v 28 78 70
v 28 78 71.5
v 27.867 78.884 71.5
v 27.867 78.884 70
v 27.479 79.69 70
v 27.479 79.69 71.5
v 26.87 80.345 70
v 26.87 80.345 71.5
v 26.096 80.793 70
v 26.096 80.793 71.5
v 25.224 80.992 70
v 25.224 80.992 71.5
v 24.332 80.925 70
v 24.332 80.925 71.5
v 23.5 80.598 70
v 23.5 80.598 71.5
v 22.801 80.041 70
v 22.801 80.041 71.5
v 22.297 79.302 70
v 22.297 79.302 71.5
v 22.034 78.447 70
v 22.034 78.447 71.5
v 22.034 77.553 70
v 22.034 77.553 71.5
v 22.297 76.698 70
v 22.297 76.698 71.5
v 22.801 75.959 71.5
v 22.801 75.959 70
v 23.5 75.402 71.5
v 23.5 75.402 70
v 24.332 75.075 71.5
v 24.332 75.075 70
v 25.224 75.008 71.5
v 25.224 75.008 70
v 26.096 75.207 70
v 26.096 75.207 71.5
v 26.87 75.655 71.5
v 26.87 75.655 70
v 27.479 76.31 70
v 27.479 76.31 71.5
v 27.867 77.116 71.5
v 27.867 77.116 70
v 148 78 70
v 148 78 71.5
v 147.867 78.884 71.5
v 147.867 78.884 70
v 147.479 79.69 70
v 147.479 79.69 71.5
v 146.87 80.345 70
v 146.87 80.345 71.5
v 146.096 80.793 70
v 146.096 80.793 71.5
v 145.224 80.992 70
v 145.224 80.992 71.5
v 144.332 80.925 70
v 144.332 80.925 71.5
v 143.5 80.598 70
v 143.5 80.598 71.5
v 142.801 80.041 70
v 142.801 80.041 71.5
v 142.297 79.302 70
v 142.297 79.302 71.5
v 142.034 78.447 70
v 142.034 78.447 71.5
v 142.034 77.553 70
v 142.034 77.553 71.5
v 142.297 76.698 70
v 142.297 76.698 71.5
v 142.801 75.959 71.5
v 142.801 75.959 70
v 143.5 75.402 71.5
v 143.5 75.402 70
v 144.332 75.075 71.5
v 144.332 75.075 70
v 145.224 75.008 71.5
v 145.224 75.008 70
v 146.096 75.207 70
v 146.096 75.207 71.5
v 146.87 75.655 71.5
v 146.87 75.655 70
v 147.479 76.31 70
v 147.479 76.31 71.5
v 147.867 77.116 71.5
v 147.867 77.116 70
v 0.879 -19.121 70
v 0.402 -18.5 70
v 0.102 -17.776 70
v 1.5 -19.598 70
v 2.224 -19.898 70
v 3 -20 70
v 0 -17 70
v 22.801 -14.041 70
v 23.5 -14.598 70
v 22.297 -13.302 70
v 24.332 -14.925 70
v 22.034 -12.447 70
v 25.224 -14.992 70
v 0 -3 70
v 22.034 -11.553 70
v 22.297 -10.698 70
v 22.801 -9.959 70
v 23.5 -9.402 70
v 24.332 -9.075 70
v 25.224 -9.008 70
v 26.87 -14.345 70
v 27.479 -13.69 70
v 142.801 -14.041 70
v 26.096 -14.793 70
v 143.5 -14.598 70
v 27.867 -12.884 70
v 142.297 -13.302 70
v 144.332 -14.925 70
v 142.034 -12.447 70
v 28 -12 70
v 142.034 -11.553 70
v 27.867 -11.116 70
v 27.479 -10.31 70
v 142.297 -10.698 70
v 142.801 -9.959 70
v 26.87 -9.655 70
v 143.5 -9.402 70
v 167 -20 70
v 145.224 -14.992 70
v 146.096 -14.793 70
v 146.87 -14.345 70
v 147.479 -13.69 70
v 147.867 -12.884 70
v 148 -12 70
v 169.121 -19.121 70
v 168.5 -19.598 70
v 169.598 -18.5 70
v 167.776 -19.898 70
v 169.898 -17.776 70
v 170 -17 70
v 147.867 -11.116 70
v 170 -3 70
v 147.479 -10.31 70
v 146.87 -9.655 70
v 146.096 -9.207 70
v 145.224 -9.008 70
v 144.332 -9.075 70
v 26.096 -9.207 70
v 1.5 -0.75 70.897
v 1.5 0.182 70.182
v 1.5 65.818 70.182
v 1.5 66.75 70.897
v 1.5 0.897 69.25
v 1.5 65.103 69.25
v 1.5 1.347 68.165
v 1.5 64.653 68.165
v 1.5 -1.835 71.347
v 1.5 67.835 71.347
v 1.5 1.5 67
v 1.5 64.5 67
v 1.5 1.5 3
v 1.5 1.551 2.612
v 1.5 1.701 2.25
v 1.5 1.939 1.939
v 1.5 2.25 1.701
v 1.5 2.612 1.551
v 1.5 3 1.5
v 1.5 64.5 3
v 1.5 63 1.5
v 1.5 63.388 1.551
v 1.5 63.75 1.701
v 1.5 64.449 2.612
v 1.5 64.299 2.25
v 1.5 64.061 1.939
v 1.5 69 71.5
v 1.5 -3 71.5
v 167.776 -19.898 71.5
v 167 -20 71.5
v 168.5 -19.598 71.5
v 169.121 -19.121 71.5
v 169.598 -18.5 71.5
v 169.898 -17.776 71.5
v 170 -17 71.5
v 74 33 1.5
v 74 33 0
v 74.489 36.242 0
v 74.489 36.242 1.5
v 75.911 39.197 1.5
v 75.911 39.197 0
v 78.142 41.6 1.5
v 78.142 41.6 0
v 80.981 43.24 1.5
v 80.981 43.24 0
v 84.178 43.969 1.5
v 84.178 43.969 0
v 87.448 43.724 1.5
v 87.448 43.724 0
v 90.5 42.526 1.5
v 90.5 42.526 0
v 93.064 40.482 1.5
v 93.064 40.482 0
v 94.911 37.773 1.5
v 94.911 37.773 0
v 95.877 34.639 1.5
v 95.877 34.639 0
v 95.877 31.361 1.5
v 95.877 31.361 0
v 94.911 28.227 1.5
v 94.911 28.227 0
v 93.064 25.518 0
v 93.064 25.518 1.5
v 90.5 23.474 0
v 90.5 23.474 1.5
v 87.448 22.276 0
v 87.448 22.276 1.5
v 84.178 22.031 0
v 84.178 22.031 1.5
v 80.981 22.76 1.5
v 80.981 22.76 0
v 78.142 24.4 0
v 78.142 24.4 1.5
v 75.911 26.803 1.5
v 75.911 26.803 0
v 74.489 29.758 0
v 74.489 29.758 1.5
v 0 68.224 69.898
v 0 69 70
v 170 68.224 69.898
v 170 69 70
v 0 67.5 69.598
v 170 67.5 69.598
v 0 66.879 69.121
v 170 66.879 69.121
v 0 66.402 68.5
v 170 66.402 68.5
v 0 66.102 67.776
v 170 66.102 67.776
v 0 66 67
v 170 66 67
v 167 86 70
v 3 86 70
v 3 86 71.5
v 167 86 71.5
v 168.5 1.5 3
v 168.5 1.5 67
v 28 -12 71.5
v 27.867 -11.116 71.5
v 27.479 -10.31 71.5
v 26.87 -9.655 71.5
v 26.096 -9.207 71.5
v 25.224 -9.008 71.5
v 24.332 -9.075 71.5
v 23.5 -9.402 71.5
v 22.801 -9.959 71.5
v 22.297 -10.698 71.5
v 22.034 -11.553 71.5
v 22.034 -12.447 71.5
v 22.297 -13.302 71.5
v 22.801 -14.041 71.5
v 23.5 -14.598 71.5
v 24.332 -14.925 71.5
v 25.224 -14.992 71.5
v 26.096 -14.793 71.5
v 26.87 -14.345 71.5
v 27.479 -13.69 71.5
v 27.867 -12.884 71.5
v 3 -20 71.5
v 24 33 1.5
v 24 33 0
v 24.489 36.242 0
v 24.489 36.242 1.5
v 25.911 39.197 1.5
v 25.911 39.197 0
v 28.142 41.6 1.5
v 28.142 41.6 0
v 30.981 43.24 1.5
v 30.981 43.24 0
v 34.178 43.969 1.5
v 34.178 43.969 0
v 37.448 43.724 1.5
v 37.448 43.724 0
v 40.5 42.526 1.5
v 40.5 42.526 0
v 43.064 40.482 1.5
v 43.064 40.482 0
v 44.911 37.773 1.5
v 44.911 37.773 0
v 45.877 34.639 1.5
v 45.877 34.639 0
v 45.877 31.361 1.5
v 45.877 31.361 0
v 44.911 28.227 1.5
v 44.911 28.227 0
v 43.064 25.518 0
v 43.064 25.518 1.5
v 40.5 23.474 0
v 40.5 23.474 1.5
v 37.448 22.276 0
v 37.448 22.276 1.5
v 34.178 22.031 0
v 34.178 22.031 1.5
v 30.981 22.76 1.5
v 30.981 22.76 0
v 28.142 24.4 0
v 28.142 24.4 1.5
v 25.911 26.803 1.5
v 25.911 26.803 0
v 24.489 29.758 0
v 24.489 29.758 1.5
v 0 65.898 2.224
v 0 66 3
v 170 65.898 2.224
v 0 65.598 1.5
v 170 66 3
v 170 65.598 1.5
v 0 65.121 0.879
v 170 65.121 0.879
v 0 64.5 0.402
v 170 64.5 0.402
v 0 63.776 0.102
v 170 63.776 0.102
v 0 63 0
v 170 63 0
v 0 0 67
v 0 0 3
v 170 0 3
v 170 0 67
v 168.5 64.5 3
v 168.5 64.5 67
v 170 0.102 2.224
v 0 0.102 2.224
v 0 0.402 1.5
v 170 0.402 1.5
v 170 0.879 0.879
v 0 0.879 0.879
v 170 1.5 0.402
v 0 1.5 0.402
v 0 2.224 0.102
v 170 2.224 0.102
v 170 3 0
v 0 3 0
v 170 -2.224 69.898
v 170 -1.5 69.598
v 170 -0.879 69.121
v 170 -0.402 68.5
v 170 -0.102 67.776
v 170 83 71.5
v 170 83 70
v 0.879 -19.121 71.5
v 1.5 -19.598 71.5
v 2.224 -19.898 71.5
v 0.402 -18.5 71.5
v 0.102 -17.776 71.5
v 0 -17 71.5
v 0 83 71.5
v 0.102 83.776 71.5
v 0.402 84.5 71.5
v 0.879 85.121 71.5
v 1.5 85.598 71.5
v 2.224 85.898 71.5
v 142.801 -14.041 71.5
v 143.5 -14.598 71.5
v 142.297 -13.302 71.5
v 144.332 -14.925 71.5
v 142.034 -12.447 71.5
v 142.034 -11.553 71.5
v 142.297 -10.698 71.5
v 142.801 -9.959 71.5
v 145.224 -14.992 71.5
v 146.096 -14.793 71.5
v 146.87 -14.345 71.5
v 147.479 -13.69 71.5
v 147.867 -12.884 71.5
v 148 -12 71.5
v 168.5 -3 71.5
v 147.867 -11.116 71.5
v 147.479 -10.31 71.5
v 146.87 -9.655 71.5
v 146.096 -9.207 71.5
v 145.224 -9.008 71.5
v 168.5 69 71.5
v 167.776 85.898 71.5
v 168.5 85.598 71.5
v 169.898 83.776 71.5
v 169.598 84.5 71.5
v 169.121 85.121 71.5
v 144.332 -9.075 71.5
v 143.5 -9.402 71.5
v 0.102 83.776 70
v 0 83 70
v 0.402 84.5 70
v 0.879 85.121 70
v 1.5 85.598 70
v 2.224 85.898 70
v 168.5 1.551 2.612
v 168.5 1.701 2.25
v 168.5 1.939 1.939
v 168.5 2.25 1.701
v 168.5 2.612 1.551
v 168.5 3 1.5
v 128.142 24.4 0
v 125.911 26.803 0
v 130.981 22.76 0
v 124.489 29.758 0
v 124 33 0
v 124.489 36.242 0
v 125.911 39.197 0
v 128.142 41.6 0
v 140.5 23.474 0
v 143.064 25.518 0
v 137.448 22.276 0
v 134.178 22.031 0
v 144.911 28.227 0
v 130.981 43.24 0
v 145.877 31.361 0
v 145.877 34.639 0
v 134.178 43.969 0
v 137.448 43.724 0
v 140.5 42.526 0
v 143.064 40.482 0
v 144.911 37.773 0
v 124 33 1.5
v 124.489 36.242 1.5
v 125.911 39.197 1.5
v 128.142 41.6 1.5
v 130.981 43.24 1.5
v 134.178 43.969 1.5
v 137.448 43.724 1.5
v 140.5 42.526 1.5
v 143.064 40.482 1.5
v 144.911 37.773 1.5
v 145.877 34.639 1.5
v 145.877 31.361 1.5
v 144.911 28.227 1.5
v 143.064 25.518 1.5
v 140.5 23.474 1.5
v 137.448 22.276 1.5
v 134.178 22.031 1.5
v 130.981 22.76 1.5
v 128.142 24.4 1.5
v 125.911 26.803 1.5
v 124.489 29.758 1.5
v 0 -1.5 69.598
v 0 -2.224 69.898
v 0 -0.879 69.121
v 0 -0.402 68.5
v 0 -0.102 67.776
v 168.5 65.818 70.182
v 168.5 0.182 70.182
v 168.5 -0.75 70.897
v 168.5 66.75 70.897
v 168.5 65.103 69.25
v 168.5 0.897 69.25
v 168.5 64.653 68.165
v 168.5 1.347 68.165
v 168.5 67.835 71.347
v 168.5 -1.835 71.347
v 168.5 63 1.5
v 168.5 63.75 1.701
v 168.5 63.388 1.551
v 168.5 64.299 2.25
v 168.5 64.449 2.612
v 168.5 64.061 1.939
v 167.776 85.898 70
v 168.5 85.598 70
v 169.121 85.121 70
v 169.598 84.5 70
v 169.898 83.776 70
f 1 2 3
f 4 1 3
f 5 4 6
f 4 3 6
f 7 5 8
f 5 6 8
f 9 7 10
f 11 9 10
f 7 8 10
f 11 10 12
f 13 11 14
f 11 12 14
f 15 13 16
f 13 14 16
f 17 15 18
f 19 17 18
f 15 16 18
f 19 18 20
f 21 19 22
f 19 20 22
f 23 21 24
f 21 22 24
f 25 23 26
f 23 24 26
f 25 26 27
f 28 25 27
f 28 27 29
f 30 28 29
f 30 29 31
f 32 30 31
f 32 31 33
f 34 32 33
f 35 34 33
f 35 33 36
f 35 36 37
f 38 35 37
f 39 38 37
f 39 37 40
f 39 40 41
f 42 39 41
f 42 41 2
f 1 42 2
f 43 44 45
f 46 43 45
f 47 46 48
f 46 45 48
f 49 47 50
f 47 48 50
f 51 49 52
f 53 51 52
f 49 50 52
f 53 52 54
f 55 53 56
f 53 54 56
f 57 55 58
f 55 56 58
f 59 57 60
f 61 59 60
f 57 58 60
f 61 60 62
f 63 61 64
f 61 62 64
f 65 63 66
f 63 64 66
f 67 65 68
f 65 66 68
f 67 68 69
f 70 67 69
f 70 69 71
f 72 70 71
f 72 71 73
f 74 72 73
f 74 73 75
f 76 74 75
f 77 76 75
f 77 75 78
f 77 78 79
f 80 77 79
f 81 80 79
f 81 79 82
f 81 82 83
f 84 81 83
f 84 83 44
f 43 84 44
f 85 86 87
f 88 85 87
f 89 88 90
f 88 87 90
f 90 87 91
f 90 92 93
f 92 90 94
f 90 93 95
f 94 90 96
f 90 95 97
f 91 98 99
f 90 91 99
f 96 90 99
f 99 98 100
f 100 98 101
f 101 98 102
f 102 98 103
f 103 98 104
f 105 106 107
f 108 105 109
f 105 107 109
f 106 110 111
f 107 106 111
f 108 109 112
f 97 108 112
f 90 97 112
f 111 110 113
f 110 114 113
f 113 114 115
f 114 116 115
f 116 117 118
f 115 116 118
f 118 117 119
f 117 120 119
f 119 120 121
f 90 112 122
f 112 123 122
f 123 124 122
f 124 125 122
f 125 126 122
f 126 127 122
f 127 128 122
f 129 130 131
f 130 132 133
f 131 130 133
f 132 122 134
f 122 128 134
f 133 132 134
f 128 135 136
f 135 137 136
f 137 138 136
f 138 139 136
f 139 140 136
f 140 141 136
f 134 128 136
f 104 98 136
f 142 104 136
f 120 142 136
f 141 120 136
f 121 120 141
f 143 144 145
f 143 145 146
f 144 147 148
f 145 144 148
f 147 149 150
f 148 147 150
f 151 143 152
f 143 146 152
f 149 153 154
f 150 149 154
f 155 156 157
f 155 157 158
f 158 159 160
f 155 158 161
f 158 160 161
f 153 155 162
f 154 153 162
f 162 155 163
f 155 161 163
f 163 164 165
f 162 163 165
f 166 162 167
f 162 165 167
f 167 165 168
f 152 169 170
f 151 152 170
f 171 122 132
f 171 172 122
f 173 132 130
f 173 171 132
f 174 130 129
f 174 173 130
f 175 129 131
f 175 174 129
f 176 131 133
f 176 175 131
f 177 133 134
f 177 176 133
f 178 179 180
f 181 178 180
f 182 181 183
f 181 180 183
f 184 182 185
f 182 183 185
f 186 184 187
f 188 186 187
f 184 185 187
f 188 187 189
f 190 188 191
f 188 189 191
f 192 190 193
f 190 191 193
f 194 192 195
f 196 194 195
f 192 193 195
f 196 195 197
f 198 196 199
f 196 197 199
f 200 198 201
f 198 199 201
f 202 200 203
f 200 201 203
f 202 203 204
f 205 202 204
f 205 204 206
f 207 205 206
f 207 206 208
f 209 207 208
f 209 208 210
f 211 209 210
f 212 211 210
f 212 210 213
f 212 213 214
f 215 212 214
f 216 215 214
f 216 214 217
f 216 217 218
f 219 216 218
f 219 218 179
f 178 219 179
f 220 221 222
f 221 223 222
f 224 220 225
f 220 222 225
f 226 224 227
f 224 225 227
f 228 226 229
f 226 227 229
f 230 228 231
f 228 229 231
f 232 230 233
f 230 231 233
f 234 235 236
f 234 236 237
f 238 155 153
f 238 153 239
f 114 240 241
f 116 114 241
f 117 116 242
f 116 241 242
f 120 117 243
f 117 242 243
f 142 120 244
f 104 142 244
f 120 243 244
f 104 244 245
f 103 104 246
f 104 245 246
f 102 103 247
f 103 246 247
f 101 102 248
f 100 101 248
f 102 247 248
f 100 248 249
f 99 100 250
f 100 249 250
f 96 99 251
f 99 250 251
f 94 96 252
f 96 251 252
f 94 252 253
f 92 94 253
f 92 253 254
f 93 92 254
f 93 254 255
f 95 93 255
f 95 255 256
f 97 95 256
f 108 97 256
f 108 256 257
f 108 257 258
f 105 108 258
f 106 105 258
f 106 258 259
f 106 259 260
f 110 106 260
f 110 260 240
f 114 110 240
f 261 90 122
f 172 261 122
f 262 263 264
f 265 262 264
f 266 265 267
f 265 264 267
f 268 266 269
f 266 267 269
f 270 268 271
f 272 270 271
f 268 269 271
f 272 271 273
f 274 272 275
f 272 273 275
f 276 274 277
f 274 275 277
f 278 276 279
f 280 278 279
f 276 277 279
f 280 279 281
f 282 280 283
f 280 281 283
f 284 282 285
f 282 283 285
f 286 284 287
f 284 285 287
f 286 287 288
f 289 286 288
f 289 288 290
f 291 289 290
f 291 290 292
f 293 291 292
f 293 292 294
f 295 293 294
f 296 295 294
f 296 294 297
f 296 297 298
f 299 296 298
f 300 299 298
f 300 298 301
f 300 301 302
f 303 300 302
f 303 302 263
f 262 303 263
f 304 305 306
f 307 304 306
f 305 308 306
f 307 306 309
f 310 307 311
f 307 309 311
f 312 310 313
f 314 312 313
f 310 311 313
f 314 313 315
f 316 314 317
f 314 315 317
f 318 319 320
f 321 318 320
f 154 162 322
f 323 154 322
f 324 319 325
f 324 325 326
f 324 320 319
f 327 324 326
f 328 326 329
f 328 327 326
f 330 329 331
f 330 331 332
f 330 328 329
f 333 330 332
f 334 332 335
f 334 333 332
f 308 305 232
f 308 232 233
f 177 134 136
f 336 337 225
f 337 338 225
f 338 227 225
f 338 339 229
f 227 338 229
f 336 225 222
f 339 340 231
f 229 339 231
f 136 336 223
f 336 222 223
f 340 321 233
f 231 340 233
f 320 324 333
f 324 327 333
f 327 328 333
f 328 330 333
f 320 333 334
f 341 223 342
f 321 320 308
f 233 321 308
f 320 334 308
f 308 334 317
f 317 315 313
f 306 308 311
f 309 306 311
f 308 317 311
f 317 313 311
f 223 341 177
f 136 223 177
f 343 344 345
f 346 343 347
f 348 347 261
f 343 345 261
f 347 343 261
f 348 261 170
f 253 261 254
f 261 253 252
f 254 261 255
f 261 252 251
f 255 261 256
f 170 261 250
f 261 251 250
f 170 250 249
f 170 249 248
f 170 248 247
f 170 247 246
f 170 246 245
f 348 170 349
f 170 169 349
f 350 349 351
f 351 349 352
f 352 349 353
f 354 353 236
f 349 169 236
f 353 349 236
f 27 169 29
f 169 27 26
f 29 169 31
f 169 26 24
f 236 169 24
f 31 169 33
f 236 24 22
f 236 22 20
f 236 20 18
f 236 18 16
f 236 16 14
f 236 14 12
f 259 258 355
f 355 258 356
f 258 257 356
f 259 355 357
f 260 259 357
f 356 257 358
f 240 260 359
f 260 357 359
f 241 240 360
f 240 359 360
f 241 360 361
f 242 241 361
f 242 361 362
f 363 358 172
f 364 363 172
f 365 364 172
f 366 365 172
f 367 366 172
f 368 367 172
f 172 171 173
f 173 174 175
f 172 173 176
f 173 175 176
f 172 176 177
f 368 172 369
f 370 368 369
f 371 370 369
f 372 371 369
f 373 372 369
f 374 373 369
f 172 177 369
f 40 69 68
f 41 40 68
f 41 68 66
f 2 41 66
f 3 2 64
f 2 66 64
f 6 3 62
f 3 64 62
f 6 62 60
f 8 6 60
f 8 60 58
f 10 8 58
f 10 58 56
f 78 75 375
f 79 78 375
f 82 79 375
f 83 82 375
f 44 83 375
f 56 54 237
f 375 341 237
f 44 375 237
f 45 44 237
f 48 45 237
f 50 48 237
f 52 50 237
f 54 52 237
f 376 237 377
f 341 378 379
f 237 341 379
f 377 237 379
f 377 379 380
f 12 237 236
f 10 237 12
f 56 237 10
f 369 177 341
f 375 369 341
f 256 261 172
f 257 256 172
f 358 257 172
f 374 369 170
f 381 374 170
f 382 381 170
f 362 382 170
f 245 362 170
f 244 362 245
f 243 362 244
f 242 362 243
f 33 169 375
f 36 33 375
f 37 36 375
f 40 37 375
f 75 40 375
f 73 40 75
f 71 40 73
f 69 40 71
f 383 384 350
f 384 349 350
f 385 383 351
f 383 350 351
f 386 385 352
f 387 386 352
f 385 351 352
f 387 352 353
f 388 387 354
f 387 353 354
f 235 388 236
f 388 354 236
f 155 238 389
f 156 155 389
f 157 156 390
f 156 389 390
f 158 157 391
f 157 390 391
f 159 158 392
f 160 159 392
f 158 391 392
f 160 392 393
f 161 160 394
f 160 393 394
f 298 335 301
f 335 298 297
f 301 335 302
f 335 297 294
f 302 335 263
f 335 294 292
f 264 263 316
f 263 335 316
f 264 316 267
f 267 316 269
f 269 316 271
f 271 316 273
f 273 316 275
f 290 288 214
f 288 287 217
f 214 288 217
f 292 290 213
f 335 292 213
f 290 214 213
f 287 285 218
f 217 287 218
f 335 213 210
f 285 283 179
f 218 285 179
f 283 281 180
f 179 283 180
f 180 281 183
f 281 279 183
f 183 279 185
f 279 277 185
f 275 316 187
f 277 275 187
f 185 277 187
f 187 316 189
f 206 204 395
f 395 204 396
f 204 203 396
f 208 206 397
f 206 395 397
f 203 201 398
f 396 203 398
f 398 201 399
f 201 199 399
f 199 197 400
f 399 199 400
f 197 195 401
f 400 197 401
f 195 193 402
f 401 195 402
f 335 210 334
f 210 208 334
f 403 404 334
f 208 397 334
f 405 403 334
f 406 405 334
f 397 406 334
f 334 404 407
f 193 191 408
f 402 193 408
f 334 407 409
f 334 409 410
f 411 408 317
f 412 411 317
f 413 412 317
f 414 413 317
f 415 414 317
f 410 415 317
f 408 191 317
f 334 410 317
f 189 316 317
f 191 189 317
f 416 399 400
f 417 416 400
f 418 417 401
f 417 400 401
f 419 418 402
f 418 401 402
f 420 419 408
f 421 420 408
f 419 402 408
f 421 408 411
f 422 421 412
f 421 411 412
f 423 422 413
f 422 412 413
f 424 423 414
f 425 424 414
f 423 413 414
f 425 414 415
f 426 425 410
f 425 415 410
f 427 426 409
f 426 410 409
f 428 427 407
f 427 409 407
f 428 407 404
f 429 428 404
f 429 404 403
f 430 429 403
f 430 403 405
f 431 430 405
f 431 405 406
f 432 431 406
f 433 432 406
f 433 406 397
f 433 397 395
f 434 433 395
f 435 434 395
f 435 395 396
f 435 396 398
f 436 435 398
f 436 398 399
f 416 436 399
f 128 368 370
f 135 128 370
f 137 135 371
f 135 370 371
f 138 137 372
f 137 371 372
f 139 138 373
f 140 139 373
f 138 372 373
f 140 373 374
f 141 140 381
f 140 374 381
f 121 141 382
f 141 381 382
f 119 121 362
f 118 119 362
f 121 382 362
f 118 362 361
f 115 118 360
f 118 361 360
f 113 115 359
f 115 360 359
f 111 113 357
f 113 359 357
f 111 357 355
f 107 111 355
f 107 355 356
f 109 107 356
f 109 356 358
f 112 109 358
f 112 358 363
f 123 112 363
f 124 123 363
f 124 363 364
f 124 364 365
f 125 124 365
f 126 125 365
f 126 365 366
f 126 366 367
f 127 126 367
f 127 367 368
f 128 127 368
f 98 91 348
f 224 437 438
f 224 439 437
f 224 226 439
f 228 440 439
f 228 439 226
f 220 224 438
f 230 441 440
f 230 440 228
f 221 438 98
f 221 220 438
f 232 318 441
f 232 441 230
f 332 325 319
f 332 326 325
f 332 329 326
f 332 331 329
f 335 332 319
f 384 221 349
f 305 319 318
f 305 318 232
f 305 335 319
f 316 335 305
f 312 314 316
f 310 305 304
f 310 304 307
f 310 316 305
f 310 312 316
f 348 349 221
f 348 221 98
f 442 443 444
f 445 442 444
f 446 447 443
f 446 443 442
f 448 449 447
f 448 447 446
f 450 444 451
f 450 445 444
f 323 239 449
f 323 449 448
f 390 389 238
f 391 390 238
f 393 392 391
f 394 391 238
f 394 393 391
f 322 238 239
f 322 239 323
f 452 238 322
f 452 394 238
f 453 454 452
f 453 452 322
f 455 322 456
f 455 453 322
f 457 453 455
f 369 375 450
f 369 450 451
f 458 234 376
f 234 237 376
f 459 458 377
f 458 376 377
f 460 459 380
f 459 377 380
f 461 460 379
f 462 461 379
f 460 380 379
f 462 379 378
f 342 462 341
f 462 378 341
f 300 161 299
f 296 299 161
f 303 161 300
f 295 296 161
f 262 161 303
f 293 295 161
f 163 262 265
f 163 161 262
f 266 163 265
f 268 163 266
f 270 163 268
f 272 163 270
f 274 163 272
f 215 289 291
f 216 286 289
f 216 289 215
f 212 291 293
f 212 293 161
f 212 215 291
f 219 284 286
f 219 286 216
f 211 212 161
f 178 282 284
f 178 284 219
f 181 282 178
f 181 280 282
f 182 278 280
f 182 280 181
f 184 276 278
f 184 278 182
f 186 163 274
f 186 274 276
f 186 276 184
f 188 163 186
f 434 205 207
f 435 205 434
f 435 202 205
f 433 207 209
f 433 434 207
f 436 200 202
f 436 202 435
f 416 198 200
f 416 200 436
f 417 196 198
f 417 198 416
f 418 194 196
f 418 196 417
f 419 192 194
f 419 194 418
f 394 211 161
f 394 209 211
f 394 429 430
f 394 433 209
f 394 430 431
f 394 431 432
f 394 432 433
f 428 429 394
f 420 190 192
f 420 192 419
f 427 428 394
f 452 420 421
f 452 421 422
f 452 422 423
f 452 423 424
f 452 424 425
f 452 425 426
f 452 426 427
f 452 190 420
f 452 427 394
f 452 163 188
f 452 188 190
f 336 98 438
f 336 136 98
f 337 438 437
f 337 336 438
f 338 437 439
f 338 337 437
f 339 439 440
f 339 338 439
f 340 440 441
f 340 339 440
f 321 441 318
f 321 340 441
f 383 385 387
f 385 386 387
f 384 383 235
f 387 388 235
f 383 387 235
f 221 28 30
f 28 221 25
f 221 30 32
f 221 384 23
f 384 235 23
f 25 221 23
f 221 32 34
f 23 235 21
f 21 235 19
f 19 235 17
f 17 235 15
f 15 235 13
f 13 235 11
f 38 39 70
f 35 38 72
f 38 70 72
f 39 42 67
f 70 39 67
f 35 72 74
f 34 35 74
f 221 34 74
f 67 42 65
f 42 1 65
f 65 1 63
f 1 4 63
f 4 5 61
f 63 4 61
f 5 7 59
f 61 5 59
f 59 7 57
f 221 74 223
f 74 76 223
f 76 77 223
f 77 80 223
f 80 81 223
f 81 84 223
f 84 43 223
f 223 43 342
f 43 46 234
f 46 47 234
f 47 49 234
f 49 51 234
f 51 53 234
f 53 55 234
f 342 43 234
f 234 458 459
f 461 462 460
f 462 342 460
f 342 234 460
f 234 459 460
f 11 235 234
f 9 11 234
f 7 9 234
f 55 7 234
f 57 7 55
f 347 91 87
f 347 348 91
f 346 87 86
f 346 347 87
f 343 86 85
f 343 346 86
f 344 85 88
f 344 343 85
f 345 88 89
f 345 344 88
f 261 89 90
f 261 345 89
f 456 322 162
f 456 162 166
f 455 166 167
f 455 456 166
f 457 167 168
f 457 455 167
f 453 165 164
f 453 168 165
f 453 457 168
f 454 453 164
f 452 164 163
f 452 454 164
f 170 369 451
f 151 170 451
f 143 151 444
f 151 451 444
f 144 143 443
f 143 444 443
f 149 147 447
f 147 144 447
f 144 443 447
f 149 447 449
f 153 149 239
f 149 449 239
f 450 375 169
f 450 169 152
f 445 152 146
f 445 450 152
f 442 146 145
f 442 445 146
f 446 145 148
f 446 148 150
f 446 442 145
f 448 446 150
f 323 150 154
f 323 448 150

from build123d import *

# Parameters (mm, degrees)
SKETCH_1_W               = 170
SKETCH_1_H               = 66
EXTRUDE_1_DEPTH          = 70
SKETCH_2_W               = 170
SKETCH_2_H               = 106
EXTRUDE_2_DEPTH          = 5
FILLET_1_R               = 3
SHELL_1_T                = -1.5
CUT_EXTRUDE_1_DEPTH      = 204.502456988
CUT_EXTRUDE_1_DEPTH_BACK = 5
SKETCH_3_W               = 3.5
SKETCH_3_H               = 106
SKETCH_4_R               = 11
CUT_EXTRUDE_2_DEPTH      = 5
SKETCH_5_R               = 3
CUT_EXTRUDE_3_DEPTH      = 5
FILLET_2_R               = 3


with BuildPart() as part:
    # 草图1 → 凸台-拉伸1 (new body)
    with BuildSketch(Plane.XY):
        with Locations((85, 33)):
            Rectangle(SKETCH_1_W, SKETCH_1_H)
    extrude(amount=EXTRUDE_1_DEPTH)

    # 草图2 → 凸台-拉伸2 (add)
    with BuildSketch(Plane.XY.offset(70)):
        with Locations((85, 33)):
            Rectangle(SKETCH_2_W, SKETCH_2_H)
    extrude(amount=EXTRUDE_2_DEPTH)

    # 圆角1
    fillet_1_edges = [part.edges().sort_by_distance(p)[0] for p in [
        (85, 0, 70),
        (85, 0, 0),
        (85, 66, 0),
        (85, 66, 70),
    ]]
    fillet(fillet_1_edges, radius=FILLET_1_R)

    # 抽壳1
    shell_1_openings = [part.faces().sort_by_distance(p)[0] for p in [
        (85, -20, 72.5),
        (85, 86, 72.5),
        (85, 33, 75),
    ]]
    offset(amount=SHELL_1_T, openings=shell_1_openings, kind=Kind.INTERSECTION)

    # 草图3 → 切除-拉伸1 (cut, two sides: drawn at the far end of the back side and taken through both)
    with BuildSketch(Plane.ZY.offset(-168.5).offset(-CUT_EXTRUDE_1_DEPTH_BACK)):
        with Locations((73.25, 33)):
            Rectangle(SKETCH_3_W, SKETCH_3_H)
    extrude(amount=CUT_EXTRUDE_1_DEPTH + CUT_EXTRUDE_1_DEPTH_BACK, mode=Mode.SUBTRACT)

    # 草图4 → 切除-拉伸2 (cut)
    with BuildSketch(Plane(origin=(0, 0, 0), x_dir=(-1, 0, 0), z_dir=(0, 0, -1))):
        with Locations((-135, 33)):
            Circle(SKETCH_4_R)
        with Locations((-85, 33)):
            Circle(SKETCH_4_R)
        with Locations((-35, 33)):
            Circle(SKETCH_4_R)
    extrude(amount=-CUT_EXTRUDE_2_DEPTH, mode=Mode.SUBTRACT)

    # 草图5 → 切除-拉伸3 (cut)
    with BuildSketch(Plane.XY.offset(71.5)):
        with Locations((145, -12)):
            Circle(SKETCH_5_R)
        with Locations((25, -12)):
            Circle(SKETCH_5_R)
        with Locations((25, 78)):
            Circle(SKETCH_5_R)
        with Locations((145, 78)):
            Circle(SKETCH_5_R)
    extrude(amount=-CUT_EXTRUDE_3_DEPTH, mode=Mode.SUBTRACT)

    # 圆角2
    fillet_2_edges = [part.edges().sort_by_distance(p)[0] for p in [
        (170, 86, 70.75),
        (0, 86, 70.75),
        (0, -20, 70.75),
        (170, -20, 70.75),
    ]]
    fillet(fillet_2_edges, radius=FILLET_2_R)


solid = part.part
